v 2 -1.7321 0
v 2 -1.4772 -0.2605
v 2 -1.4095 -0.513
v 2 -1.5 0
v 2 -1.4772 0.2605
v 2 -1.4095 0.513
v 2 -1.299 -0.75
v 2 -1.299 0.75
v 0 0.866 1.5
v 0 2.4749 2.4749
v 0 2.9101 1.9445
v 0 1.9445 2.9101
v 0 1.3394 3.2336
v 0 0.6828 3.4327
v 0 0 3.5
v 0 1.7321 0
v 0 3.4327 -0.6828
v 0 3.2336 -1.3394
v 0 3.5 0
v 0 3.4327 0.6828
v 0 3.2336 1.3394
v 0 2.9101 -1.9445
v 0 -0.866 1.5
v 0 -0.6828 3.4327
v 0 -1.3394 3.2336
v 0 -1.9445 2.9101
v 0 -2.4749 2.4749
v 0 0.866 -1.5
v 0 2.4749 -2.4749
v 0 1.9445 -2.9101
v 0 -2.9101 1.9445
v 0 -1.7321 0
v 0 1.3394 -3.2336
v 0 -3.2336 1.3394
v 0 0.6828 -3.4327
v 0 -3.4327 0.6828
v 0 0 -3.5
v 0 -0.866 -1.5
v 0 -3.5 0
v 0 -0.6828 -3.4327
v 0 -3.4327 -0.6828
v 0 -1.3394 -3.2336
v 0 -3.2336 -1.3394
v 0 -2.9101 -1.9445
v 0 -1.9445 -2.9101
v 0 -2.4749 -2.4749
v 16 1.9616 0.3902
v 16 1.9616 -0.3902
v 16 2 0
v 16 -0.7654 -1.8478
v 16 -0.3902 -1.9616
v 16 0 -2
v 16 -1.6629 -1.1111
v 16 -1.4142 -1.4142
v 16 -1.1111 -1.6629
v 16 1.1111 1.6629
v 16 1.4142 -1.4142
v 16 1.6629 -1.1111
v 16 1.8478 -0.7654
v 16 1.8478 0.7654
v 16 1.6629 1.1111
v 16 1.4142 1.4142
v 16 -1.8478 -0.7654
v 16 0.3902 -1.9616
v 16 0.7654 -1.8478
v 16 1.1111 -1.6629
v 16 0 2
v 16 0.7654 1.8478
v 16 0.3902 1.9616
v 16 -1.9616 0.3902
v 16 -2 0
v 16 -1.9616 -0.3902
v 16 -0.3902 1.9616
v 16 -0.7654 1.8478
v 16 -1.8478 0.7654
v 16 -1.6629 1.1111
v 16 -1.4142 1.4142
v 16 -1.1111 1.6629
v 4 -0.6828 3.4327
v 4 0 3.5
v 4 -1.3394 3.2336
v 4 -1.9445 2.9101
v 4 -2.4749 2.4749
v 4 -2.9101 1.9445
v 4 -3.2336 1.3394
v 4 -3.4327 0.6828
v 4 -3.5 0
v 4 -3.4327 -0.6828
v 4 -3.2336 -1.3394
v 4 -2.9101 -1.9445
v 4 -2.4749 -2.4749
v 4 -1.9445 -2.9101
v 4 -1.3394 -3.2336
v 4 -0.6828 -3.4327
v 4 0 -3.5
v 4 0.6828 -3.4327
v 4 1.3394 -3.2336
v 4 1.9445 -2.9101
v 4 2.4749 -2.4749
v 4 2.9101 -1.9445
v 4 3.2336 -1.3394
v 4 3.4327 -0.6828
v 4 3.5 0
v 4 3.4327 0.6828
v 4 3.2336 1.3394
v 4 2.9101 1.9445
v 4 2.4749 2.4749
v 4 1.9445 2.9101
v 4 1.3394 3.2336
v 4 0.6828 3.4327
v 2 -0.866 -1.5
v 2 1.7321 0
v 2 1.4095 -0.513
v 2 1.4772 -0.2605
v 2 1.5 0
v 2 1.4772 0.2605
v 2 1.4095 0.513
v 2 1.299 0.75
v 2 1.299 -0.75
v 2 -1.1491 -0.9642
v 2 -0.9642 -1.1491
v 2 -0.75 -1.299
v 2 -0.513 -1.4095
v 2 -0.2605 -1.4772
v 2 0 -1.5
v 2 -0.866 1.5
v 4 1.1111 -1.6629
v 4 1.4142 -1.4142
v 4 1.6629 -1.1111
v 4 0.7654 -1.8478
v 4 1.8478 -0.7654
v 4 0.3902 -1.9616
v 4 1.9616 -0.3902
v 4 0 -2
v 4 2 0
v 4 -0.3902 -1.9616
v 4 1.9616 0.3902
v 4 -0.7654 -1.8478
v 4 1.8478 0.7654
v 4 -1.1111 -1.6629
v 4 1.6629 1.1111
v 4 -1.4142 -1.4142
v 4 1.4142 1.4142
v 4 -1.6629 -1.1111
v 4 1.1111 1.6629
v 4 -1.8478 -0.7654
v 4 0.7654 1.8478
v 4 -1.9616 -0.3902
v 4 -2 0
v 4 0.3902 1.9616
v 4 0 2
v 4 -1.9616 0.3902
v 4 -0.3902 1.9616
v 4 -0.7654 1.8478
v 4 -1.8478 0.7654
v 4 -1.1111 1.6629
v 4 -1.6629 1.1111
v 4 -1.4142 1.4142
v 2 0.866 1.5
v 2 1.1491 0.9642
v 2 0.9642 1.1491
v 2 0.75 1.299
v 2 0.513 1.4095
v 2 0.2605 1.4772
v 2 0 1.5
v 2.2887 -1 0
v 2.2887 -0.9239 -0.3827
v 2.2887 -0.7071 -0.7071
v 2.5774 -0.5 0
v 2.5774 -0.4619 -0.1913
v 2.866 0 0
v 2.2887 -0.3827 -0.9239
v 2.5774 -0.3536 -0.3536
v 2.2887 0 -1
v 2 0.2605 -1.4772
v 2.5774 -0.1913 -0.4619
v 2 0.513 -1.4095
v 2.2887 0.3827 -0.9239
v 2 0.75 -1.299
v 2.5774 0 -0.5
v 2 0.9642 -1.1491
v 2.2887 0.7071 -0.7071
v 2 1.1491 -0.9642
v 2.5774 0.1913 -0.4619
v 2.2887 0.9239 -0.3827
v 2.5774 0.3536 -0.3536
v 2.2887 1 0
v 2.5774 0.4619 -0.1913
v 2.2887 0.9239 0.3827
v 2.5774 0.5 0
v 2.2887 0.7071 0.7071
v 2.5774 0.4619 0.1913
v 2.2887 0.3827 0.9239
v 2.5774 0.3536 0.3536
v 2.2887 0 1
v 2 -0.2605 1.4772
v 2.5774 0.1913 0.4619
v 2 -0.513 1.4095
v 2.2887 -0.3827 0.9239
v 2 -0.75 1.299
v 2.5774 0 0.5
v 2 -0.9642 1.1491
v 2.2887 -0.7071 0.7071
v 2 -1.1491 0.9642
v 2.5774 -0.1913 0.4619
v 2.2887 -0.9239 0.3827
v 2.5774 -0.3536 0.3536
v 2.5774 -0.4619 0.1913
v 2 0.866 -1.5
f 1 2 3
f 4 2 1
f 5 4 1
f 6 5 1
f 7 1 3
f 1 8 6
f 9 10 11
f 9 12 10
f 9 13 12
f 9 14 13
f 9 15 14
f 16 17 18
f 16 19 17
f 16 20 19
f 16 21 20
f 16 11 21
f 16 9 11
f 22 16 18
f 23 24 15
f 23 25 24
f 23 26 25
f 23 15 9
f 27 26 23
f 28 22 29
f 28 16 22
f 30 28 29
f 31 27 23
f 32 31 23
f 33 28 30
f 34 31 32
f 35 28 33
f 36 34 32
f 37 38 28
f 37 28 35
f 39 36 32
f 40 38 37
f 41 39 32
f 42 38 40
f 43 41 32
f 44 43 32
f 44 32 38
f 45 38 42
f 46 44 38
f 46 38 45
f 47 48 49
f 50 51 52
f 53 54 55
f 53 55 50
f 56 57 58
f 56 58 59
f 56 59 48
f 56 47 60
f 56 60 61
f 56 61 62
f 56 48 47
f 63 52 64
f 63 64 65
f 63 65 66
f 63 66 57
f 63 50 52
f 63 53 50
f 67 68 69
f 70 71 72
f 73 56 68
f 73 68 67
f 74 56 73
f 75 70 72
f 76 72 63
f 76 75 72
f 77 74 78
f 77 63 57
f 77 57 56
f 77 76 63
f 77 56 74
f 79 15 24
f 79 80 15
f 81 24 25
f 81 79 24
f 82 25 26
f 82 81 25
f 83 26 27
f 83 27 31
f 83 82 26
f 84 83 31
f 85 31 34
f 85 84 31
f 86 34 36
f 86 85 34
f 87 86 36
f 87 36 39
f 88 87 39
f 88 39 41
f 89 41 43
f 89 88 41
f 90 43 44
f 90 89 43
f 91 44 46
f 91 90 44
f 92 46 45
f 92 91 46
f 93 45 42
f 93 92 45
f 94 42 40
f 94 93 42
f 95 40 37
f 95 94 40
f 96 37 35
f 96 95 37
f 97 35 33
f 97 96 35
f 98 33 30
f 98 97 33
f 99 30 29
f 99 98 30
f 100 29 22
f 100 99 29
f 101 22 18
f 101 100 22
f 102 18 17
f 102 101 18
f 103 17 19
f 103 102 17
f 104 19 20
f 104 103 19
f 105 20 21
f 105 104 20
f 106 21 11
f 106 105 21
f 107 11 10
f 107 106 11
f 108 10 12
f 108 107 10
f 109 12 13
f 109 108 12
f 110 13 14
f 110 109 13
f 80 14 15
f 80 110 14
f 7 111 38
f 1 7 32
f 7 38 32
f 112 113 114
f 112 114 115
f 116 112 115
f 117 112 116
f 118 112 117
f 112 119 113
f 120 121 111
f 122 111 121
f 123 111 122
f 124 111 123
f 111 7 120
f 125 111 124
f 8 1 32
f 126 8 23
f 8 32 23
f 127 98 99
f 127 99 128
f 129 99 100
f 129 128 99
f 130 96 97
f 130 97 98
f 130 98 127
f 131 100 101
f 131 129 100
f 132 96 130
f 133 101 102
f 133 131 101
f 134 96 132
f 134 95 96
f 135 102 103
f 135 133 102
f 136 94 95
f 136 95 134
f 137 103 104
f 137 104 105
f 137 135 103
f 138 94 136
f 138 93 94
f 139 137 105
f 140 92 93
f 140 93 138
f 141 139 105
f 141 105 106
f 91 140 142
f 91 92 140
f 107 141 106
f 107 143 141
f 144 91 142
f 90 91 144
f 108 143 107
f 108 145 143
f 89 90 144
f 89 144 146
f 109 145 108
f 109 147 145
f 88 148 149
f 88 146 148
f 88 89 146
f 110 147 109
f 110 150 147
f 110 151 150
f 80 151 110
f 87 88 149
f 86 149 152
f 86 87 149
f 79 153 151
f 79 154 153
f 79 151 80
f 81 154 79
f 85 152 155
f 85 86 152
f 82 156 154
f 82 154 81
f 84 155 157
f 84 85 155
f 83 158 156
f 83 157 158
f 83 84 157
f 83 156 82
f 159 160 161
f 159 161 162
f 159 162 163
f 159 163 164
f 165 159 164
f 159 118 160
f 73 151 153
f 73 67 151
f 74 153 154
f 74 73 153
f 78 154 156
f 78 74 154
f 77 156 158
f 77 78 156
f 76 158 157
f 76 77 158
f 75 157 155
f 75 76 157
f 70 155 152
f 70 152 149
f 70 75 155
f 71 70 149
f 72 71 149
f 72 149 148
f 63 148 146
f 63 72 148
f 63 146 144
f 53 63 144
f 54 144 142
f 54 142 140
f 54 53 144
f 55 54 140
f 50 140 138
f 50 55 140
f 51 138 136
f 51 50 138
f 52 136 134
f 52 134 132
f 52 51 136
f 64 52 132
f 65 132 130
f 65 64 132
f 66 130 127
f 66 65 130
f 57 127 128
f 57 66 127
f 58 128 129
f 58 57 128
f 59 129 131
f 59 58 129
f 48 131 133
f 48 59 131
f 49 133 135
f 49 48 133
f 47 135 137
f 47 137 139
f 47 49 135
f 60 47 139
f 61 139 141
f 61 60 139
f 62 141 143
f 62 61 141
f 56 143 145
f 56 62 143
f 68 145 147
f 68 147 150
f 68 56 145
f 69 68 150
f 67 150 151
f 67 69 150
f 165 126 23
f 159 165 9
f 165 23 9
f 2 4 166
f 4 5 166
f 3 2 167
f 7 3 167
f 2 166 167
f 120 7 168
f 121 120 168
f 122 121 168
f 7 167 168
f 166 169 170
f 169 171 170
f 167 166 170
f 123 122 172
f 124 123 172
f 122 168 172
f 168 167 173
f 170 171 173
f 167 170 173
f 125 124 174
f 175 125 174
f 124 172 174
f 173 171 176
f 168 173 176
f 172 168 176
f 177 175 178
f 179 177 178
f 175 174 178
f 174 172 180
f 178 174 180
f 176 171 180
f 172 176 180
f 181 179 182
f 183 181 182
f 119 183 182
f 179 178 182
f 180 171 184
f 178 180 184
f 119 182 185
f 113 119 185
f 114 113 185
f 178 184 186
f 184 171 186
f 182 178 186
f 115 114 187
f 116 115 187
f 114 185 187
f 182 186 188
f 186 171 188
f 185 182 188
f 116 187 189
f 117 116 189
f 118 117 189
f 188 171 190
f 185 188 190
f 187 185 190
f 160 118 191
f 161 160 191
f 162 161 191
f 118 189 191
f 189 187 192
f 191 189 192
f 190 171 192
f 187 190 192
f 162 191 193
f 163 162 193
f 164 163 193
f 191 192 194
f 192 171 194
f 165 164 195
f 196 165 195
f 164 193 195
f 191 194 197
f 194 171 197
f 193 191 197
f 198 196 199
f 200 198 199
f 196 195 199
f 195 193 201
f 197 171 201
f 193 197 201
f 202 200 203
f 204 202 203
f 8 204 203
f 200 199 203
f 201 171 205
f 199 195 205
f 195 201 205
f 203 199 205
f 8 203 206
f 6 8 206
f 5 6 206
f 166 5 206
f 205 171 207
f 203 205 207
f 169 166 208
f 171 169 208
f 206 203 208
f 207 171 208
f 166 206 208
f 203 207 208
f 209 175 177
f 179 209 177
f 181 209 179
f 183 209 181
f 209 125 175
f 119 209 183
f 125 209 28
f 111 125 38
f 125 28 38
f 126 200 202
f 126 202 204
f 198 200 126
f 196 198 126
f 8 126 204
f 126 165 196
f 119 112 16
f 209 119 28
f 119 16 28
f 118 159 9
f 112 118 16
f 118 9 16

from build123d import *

# Parameters (mm, degrees)
CUT_EXTRUDE1_DEPTH = 2


with BuildPart() as part:
    # Sketch1 → Revolve1 (revolve)
    with BuildSketch(Plane.XY, mode=Mode.PRIVATE) as revolve1_sk:
        Polygon((0, 0), (0, 3.5), (4, 3.5), (4, 2), (16, 2), (16, 0), align=None)
    revolve(revolve1_sk.sketch.rotate(Axis((0, 0, 0), (1, 0, 0)), 90), axis=Axis((0, 0, 0), (1, 0, 0)))

    # Sketch2 → Cut-Revolve1 (revolve, cut)
    with BuildSketch(Plane.XY, mode=Mode.PRIVATE) as cut_revolve1_sk:
        Polygon((0, 1.5), (2, 1.5), (2.866025404, 0), (0, 0), align=None)
    revolve(cut_revolve1_sk.sketch.rotate(Axis((0, 0, 0), (1, 0, 0)), 180), axis=Axis((0, 0, 0), (1, 0, 0)), mode=Mode.SUBTRACT)

    # Sketch3 → Cut-Extrude1 (cut)
    with BuildSketch(Plane.ZY):
        Polygon((0, -1.732050808), (1.5, -0.866025404), (1.5, 0.866025404), (0, 1.732050808), (-1.5, 0.866025404), (-1.5, -0.866025404), align=None)
    extrude(amount=-CUT_EXTRUDE1_DEPTH, mode=Mode.SUBTRACT)


solid = part.part
